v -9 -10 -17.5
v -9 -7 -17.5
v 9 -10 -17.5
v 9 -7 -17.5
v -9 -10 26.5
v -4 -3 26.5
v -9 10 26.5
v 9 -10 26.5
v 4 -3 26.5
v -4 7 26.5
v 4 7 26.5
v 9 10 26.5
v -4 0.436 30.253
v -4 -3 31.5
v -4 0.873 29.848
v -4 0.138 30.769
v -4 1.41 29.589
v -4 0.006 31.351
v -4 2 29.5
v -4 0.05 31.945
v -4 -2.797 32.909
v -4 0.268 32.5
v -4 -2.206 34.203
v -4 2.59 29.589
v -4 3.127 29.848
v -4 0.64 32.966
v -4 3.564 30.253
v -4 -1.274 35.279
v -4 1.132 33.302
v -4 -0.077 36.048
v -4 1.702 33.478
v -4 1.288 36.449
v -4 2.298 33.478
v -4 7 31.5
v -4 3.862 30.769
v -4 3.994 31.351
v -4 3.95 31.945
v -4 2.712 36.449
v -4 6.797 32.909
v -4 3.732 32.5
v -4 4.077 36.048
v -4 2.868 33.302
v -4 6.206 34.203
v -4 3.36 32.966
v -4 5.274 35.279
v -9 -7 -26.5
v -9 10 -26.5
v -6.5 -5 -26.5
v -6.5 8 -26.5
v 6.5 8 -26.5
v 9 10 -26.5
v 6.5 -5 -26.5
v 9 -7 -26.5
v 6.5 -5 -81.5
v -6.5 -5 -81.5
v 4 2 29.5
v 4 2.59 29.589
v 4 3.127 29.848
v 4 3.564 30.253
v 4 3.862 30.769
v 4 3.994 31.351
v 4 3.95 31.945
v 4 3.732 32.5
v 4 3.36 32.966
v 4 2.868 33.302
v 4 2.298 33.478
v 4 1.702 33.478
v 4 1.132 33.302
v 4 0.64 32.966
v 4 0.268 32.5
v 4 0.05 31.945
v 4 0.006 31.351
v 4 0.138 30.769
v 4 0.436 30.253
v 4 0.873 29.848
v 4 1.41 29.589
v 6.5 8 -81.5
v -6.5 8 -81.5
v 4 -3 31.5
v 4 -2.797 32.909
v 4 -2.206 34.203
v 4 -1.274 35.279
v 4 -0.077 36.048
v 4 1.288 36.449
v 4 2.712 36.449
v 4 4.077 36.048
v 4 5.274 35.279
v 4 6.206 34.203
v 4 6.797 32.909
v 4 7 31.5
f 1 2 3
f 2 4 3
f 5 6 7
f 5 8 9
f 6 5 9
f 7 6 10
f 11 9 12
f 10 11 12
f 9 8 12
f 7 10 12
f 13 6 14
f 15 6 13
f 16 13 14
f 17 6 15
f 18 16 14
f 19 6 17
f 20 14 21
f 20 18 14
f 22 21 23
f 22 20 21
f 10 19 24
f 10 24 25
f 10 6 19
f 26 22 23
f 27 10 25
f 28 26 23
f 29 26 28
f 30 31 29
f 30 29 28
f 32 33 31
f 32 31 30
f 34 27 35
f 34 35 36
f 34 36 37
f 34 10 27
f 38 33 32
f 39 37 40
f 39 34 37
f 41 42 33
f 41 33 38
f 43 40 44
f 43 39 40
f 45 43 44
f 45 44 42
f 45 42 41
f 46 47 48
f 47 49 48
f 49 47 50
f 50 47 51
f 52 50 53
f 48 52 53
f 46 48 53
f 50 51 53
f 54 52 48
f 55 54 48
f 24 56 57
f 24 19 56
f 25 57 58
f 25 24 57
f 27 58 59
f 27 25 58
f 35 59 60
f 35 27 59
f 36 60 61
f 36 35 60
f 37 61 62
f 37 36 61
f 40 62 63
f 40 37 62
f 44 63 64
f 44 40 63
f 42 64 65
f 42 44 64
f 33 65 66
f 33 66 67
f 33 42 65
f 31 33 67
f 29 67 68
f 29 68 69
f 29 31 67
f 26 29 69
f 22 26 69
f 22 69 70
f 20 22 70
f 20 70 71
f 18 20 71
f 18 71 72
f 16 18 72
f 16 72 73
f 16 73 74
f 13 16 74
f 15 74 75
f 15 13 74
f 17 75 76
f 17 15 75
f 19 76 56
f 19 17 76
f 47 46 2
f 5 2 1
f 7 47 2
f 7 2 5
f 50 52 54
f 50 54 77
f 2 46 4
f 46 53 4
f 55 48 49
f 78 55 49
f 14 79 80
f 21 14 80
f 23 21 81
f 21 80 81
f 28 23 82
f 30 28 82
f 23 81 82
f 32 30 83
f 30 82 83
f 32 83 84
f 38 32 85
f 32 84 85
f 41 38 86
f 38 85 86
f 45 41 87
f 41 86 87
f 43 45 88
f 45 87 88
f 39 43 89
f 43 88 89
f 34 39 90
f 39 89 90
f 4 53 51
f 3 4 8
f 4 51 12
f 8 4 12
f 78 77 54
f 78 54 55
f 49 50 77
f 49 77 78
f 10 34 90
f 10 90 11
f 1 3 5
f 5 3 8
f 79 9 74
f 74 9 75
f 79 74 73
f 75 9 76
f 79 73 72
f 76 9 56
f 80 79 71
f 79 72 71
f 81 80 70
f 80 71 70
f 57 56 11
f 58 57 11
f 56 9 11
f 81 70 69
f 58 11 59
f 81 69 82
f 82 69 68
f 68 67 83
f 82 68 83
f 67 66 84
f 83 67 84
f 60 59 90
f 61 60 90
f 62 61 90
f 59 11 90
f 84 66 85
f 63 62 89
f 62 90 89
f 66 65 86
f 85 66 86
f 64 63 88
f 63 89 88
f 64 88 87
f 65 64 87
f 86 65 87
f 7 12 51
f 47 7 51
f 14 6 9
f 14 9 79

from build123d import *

# Parameters (mm, degrees)
BOSS_EXTRUDE1_DEPTH = 9
SKETCH2_R           = 2
BOSS_EXTRUDE2_DEPTH = 4
SKETCH3_W           = 13
SKETCH3_H           = 13
BOSS_EXTRUDE3_DEPTH = 55


with BuildPart() as part:
    # Sketch1 → Boss-Extrude1 (new, symmetric)
    with BuildSketch(Plane(origin=(0, 0, 0), x_dir=(0, 0, -1), z_dir=(1, 0, 0))):
        Polygon((-26.5, 10), (26.5, 10), (26.5, -7), (17.5, -7), (17.5, -10), (-26.5, -10), align=None)
    extrude(amount=BOSS_EXTRUDE1_DEPTH, both=True)

    # Sketch2 → Boss-Extrude2 (add, symmetric)
    with BuildSketch(Plane(origin=(0, 0, 0), x_dir=(0, 0, -1), z_dir=(1, 0, 0))):
        with BuildLine():
            Line((-31.5, 7), (-26.5, 7))
            Line((-26.5, 7), (-26.5, -3))
            Line((-26.5, -3), (-31.5, -3))
            ThreePointArc((-31.5, -3), (-36.5, 2), (-31.5, 7))
        make_face()
        with Locations((-31.5, 2)):
            Circle(SKETCH2_R, mode=Mode.SUBTRACT)
    extrude(amount=BOSS_EXTRUDE2_DEPTH, both=True)

    # Sketch3 → Boss-Extrude3 (add)
    with BuildSketch(Plane(origin=(0, 0, -26.5), x_dir=(-1, 0, 0), z_dir=(0, 0, -1))):
        with Locations((0, 1.5)):
            Rectangle(SKETCH3_W, SKETCH3_H)
    extrude(amount=BOSS_EXTRUDE3_DEPTH)


solid = part.part
